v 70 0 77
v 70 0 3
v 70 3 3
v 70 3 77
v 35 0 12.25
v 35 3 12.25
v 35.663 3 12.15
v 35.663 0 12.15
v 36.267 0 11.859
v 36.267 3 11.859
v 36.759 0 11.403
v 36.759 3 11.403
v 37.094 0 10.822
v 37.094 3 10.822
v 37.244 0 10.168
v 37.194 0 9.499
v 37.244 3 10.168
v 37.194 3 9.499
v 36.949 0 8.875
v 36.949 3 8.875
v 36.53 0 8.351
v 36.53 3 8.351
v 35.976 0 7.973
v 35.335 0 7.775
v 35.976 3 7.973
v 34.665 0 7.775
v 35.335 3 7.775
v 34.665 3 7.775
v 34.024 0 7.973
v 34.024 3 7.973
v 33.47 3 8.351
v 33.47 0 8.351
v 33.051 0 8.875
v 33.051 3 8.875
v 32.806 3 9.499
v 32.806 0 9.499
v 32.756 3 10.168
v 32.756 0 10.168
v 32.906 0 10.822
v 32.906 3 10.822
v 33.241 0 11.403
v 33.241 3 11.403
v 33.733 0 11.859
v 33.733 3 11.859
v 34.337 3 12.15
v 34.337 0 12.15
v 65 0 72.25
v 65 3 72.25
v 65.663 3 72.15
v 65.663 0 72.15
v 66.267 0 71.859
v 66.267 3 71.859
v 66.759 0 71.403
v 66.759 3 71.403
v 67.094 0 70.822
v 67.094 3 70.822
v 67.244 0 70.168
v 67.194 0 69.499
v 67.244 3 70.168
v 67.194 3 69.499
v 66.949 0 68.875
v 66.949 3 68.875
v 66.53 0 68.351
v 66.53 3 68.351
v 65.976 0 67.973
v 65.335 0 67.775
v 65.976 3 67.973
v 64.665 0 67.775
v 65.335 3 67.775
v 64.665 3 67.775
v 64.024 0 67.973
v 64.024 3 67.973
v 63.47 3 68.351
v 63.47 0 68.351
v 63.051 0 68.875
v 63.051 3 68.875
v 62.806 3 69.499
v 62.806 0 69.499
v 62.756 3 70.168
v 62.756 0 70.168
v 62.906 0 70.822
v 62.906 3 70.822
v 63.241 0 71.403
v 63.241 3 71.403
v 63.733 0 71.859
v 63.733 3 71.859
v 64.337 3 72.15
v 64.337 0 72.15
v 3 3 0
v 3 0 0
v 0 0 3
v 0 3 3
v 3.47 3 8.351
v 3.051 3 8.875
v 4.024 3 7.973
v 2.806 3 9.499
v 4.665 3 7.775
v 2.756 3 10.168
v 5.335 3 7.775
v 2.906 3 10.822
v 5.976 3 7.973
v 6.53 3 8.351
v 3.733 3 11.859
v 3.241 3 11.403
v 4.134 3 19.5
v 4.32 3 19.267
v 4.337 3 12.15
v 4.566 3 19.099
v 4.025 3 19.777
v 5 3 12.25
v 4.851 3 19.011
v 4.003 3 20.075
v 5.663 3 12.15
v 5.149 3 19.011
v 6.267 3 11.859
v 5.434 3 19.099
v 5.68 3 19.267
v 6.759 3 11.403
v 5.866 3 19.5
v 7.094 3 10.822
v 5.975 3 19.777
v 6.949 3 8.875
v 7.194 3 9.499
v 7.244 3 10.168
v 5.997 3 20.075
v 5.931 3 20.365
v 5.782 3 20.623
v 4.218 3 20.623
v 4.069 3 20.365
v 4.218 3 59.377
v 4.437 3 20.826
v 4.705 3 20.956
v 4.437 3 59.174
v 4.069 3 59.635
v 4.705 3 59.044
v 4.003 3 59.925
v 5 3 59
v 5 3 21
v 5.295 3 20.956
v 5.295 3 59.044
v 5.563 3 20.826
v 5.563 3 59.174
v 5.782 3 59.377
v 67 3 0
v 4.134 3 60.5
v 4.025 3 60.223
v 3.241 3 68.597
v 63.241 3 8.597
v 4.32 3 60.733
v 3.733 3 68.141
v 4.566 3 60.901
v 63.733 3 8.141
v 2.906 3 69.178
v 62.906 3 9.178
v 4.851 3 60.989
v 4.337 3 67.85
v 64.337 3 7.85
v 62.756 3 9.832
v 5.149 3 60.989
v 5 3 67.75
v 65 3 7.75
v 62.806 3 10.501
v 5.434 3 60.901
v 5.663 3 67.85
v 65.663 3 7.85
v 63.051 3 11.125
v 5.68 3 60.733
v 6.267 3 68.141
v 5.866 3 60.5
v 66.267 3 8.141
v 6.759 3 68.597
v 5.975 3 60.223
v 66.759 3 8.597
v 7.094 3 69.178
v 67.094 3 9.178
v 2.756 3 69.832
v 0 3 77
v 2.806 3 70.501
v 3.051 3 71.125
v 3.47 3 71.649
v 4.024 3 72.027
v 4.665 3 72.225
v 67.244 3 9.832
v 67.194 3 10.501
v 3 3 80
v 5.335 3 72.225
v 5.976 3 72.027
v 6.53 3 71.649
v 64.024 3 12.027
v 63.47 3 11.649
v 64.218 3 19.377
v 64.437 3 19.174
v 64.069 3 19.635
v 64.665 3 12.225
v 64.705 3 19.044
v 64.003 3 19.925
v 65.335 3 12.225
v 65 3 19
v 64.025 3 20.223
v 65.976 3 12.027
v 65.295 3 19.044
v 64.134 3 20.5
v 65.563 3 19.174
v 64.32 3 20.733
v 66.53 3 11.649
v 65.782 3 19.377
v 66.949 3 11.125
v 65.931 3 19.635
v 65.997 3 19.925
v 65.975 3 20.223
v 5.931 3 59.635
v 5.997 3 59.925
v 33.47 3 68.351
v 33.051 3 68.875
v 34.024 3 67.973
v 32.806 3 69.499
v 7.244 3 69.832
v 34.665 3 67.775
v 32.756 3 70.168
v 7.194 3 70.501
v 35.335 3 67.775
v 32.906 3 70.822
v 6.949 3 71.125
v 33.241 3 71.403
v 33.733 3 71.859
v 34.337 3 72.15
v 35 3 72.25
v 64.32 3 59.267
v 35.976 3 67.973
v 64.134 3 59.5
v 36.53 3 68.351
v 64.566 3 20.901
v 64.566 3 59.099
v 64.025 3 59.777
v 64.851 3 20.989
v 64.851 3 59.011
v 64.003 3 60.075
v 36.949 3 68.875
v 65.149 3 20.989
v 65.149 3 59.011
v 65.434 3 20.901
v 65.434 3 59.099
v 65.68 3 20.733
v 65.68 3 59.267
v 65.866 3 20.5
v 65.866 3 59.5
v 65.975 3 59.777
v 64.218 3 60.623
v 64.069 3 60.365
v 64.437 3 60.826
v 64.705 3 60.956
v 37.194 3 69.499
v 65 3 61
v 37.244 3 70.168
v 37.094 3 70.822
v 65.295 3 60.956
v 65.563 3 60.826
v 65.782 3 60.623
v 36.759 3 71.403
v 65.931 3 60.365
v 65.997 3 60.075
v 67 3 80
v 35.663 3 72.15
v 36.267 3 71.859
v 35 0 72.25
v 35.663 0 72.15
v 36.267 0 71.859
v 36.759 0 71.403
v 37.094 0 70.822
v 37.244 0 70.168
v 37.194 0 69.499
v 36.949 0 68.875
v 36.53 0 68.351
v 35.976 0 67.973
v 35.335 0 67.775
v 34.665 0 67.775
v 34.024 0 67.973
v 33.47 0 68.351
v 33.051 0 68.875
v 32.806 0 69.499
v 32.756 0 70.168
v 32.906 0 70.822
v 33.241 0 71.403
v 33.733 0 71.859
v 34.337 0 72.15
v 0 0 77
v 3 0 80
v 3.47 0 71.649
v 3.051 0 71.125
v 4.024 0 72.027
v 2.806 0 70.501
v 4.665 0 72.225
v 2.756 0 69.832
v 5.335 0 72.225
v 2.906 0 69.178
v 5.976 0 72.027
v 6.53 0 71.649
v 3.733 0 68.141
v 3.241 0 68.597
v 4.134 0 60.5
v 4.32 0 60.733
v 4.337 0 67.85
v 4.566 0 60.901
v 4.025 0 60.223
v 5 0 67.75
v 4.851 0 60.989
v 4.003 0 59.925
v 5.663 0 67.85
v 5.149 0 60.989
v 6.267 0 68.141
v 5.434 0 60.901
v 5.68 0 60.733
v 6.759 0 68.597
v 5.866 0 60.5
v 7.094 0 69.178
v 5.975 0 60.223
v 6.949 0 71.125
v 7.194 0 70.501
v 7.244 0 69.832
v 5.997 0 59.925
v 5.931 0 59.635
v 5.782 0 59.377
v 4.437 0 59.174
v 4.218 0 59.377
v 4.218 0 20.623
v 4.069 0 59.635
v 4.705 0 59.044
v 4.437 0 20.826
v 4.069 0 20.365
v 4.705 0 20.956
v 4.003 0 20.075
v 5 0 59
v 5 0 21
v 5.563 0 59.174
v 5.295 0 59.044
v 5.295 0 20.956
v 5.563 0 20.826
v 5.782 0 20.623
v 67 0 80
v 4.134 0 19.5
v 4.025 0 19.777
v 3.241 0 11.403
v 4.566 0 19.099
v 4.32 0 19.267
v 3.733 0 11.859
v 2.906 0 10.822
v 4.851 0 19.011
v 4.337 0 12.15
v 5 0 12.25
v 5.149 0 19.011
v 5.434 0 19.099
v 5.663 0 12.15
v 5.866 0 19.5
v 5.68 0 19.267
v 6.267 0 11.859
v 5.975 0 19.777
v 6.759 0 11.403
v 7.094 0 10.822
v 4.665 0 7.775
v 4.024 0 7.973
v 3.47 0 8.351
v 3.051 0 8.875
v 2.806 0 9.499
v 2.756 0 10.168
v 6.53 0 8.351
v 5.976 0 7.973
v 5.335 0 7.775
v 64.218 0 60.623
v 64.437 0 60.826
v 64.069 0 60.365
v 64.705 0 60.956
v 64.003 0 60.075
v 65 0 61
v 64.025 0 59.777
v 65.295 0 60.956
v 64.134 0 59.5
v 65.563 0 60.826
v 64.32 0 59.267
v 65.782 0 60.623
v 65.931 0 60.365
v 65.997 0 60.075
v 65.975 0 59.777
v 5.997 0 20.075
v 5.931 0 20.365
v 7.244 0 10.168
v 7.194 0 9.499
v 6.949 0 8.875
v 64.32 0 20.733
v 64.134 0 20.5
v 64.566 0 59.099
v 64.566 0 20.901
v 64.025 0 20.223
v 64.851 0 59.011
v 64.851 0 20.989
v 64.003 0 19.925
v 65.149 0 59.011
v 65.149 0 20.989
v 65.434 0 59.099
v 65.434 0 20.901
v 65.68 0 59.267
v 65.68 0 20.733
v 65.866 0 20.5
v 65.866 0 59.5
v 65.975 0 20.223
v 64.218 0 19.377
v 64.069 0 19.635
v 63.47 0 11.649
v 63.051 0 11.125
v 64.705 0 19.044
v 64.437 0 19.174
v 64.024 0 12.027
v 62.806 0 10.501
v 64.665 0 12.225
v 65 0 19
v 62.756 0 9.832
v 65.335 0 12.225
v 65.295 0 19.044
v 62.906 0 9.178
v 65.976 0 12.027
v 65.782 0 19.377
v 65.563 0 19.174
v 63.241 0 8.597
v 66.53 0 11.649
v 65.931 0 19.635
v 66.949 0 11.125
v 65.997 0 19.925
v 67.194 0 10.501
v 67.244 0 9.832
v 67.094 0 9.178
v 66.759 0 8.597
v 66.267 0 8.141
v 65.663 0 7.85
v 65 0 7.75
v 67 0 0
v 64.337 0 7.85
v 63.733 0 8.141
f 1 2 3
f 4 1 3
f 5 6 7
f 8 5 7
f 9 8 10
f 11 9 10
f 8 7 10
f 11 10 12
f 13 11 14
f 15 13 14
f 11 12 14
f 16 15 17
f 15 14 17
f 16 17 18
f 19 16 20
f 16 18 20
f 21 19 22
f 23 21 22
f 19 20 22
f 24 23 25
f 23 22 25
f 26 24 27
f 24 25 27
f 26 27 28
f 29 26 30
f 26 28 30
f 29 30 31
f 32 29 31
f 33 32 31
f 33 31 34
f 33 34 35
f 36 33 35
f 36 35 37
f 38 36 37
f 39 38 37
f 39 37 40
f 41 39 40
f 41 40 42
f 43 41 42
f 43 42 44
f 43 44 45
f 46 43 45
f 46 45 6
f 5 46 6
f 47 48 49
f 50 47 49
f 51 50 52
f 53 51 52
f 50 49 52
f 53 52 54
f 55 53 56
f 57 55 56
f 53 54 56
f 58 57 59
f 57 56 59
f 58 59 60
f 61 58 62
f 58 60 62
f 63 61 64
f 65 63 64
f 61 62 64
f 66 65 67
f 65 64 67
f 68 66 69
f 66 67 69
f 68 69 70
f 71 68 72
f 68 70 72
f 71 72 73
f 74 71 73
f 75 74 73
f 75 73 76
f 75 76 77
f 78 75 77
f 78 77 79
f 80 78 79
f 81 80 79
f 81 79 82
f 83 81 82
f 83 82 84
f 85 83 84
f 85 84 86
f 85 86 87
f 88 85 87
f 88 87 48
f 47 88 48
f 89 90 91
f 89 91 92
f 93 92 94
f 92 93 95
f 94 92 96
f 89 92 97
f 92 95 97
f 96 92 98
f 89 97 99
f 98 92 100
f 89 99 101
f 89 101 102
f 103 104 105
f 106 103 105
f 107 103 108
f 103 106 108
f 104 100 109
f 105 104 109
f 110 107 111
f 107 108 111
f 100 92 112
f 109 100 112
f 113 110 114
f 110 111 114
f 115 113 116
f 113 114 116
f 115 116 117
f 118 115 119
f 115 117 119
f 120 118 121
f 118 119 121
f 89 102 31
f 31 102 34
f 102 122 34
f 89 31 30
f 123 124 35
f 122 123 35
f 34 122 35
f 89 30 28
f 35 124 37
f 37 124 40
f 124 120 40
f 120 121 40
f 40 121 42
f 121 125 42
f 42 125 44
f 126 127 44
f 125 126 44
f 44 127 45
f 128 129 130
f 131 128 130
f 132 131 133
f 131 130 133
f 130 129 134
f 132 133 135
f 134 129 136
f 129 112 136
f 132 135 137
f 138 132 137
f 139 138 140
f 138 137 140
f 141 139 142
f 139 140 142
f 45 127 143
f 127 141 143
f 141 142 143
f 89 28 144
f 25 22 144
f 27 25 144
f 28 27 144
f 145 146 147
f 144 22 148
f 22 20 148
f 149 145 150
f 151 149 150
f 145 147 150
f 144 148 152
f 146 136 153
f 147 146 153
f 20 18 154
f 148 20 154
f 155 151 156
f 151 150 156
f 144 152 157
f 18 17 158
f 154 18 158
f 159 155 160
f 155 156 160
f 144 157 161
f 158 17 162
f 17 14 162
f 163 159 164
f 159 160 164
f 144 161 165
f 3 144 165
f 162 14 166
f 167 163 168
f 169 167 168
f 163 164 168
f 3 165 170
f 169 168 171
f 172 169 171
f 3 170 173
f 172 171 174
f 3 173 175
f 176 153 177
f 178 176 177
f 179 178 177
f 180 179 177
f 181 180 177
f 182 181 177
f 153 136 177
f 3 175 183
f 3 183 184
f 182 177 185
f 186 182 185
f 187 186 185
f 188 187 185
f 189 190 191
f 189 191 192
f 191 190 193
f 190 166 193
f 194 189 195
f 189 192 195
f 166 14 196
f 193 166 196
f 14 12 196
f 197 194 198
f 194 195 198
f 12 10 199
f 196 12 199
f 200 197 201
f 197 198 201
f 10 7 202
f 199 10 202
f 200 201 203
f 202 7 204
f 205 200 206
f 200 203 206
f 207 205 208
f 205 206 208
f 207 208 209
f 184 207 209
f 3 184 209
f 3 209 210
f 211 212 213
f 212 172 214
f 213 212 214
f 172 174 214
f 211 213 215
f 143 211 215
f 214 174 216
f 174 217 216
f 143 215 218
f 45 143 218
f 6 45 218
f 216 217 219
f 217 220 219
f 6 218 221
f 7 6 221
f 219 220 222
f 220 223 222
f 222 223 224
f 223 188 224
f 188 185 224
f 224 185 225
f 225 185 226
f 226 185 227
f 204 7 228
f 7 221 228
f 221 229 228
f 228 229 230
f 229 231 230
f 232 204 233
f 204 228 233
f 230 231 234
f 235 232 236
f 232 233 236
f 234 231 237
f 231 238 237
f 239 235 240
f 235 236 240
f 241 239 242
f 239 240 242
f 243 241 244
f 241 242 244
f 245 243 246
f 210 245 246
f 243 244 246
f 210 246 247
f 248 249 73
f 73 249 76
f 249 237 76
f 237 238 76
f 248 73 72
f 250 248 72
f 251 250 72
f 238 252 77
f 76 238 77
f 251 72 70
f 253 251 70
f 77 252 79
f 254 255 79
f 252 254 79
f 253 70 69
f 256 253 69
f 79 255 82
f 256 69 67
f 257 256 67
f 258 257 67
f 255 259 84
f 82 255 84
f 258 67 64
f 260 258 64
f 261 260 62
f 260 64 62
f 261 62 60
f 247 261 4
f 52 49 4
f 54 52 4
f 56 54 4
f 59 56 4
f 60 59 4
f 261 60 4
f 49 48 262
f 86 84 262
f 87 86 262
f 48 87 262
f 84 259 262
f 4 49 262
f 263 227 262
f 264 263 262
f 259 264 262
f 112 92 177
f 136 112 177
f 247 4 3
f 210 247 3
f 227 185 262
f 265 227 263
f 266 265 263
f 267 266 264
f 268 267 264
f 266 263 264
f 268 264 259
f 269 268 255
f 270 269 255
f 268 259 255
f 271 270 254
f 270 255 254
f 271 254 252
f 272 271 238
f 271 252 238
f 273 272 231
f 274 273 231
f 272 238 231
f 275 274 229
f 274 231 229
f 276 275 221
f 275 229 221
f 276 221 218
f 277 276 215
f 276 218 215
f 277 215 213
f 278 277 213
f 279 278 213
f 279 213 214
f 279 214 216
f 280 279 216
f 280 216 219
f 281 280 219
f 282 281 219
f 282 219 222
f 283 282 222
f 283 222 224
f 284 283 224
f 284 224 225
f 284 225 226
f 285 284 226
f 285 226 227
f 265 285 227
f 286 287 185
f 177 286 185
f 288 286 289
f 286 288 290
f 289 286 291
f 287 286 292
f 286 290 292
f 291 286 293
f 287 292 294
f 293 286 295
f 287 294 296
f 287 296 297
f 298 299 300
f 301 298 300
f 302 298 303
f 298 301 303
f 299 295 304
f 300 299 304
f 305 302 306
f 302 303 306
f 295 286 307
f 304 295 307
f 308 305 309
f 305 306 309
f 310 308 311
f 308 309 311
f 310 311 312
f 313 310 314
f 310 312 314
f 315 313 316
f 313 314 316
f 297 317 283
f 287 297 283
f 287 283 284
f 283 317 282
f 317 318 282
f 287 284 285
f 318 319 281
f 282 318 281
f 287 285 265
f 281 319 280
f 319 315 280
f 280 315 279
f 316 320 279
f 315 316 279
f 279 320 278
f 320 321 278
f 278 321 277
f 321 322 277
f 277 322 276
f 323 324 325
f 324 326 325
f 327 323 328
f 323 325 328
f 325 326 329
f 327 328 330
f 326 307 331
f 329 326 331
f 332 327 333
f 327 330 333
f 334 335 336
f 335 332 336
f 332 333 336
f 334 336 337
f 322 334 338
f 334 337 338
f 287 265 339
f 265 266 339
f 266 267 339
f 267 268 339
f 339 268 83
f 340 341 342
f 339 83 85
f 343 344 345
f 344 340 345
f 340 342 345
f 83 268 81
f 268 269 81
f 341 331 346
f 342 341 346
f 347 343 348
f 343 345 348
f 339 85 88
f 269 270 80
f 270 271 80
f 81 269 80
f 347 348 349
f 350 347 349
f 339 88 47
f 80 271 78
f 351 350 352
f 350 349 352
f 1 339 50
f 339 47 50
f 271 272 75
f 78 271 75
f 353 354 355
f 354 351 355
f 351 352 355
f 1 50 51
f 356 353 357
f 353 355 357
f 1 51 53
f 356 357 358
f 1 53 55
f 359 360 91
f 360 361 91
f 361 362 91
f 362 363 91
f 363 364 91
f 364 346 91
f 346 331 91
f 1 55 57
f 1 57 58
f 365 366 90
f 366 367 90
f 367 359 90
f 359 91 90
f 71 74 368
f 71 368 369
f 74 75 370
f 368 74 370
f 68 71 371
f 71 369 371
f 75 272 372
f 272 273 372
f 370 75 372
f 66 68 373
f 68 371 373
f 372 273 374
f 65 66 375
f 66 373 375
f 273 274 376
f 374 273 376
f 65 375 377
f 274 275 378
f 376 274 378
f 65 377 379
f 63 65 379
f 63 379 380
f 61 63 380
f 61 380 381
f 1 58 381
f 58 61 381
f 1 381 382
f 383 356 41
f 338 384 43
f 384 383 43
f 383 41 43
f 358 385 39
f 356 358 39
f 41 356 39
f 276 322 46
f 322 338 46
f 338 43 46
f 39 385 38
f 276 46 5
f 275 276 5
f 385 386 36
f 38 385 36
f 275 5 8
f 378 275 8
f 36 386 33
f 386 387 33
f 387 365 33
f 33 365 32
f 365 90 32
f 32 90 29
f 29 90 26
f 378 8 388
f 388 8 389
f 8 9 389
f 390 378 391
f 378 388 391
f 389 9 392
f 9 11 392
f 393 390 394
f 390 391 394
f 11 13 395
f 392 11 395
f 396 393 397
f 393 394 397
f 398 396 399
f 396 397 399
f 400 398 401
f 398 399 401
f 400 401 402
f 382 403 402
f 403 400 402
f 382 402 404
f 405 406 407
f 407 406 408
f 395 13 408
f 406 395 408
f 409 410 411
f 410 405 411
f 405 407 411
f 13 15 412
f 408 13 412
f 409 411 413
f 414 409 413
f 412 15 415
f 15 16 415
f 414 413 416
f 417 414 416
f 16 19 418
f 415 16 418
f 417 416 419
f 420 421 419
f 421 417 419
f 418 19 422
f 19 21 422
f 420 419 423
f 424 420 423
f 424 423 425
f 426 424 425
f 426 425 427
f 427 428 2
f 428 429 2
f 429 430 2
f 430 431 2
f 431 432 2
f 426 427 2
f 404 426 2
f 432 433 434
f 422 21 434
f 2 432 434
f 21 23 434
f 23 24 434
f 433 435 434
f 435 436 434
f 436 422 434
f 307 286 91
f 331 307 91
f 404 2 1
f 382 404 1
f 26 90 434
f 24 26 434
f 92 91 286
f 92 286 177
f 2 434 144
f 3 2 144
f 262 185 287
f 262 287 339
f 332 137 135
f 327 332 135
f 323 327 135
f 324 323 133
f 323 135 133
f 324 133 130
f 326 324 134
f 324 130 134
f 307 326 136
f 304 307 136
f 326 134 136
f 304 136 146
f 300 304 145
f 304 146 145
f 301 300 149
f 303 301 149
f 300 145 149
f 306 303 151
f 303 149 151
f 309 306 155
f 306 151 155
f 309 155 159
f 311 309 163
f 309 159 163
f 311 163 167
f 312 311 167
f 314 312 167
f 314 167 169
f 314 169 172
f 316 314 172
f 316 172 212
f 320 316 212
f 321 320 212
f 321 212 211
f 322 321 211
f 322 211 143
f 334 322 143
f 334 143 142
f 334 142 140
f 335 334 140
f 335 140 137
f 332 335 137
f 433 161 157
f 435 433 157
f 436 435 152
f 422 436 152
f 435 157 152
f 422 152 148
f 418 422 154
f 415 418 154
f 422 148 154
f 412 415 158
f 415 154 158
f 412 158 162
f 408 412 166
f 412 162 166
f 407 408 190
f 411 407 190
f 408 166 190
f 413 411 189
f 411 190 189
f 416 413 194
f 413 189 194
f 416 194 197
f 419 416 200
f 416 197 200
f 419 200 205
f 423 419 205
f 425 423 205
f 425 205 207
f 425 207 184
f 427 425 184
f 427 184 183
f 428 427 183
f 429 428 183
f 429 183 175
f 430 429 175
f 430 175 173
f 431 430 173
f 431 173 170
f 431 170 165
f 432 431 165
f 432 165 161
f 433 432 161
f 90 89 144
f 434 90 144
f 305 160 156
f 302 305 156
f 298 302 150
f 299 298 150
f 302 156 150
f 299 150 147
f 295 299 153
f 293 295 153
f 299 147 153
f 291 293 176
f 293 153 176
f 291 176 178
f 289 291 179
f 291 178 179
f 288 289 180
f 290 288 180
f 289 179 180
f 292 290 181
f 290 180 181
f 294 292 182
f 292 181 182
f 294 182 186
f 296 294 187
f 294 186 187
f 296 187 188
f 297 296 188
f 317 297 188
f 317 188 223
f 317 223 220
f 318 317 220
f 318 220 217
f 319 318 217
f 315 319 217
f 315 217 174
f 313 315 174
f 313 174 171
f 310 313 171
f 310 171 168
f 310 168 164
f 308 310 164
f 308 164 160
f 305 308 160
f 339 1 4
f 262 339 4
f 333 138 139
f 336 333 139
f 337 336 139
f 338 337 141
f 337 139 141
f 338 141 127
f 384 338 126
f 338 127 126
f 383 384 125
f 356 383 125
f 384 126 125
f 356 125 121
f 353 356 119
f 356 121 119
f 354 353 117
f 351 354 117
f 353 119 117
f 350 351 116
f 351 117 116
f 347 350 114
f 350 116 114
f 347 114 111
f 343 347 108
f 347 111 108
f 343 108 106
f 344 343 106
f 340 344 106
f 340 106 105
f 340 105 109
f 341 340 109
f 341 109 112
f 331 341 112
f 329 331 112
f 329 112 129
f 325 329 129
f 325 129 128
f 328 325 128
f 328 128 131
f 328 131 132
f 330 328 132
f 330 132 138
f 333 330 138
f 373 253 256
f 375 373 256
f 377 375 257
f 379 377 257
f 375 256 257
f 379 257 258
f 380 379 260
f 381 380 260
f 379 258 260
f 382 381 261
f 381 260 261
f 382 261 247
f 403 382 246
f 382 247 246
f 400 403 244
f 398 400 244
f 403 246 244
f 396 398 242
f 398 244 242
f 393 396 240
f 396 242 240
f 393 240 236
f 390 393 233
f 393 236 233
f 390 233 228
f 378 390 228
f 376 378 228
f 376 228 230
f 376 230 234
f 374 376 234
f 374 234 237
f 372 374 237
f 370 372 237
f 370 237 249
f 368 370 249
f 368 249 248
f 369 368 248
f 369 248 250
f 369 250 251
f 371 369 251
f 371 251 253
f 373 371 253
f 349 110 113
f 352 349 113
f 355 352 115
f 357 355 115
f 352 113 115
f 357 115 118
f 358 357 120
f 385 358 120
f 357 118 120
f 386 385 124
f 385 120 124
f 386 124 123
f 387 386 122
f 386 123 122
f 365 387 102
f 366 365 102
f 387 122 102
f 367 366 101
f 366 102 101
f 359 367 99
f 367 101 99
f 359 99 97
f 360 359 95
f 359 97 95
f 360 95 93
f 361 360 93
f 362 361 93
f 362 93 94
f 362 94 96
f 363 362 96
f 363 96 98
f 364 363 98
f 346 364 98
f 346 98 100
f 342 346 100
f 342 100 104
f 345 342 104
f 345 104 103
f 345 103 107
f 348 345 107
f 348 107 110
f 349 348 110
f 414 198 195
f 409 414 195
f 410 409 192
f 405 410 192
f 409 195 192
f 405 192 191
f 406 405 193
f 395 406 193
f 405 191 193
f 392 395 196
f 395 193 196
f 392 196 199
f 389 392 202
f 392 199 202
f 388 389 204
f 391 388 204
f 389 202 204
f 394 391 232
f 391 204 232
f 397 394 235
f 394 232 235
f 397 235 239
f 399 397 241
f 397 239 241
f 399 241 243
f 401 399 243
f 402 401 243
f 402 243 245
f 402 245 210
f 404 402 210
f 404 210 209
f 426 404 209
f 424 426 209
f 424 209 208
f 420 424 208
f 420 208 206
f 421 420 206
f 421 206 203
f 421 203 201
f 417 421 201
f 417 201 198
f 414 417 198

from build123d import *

# Parameters (mm, degrees)
ESQUISSE1_W             = 70
ESQUISSE1_H             = 12
BOSS_EXTRU_1_DEPTH      = 80
ESQUISSE2_W             = 12
ESQUISSE2_H             = 6
ENL_V_MAT_EXTRU_1_DEPTH = 107.976632963
ESQUISSE4_R             = 2.25
ENL_V_MAT_EXTRU_3_DEPTH = 107.976632963
ESQUISSE5_W             = 12
ESQUISSE5_H             = 10
BOSS_EXTRU_2_DEPTH      = 6
CHANFREIN1_SIZE         = 3
ESQUISSE6_R             = 1
ENL_V_MAT_EXTRU_4_DEPTH = 12
ESQUISSE8_W             = 70
ESQUISSE8_H             = 9
ENL_V_MAT_EXTRU_8_DEPTH = 80


with BuildPart() as part:
    # Esquisse1 → Boss.-Extru.1 (new body)
    with BuildSketch(Plane.XY):
        with Locations((35, 6)):
            Rectangle(ESQUISSE1_W, ESQUISSE1_H)
    extrude(amount=BOSS_EXTRU_1_DEPTH)

    # Esquisse2 → Enlèv. mat.-Extru.1 (cut, through all)
    with BuildSketch(Plane.XY.offset(80)):
        with Locations((52.5, 9)):
            Rectangle(ESQUISSE2_W, ESQUISSE2_H)
        with Locations((17.5, 9)):
            Rectangle(ESQUISSE2_W, ESQUISSE2_H)
    extrude(amount=-ENL_V_MAT_EXTRU_1_DEPTH, mode=Mode.SUBTRACT)

    # Esquisse4 → Enlèv. mat.-Extru.3 (cut, through all)
    with BuildSketch(Plane(origin=(0, 12, 0), x_dir=(1, 0, 0), z_dir=(0, 1, 0))):
        with Locations(Location((5, -10, 0), (0, 0, 270))):
            Circle(ESQUISSE4_R)
        with Locations(Location((65, -70, 0), (0, 0, 270))):
            Circle(ESQUISSE4_R)
        with Locations(Location((65, -10, 0), (0, 0, 90))):
            Circle(ESQUISSE4_R)
        with Locations(Location((5, -70, 0), (0, 0, 90))):
            Circle(ESQUISSE4_R)
        with Locations(Location((35, -10, 0), (0, 0, 270))):
            Circle(ESQUISSE4_R)
        with Locations(Location((35, -70, 0), (0, 0, 270))):
            Circle(ESQUISSE4_R)
    extrude(amount=-ENL_V_MAT_EXTRU_3_DEPTH, mode=Mode.SUBTRACT)

    # Esquisse5 → Boss.-Extru.2 (add)
    with BuildSketch(Plane(origin=(0, 12, 0), x_dir=(1, 0, 0), z_dir=(0, 1, 0))):
        with Locations((17.5, -75)):
            Rectangle(ESQUISSE5_W, ESQUISSE5_H)
        with Locations((52.5, -75)):
            Rectangle(ESQUISSE5_W, ESQUISSE5_H)
        with Locations((52.5, -5)):
            Rectangle(ESQUISSE5_W, ESQUISSE5_H)
        with Locations((17.5, -5)):
            Rectangle(ESQUISSE5_W, ESQUISSE5_H)
    extrude(amount=-BOSS_EXTRU_2_DEPTH)

    # Chanfrein1
    chanfrein1_edges = [part.edges().sort_by_distance(p)[0] for p in [
        (70, 6, 80),
        (0, 6, 80),
        (70, 6, 0),
        (0, 6, 0),
    ]]
    chamfer(chanfrein1_edges, length=CHANFREIN1_SIZE)

    # Esquisse6 → Enlèv. mat.-Extru.4 (cut)
    with BuildSketch(Plane(origin=(0, 12, 0), x_dir=(1, 0, 0), z_dir=(0, 1, 0))):
        with Locations(Location((5, -20, 0), (0, 0, 270))):
            Circle(ESQUISSE6_R)
        with Locations(Location((5, -60, 0), (0, 0, 90))):
            Circle(ESQUISSE6_R)
        with Locations(Location((65, -60, 0), (0, 0, 270))):
            Circle(ESQUISSE6_R)
        with Locations(Location((65, -20, 0), (0, 0, 90))):
            Circle(ESQUISSE6_R)
    extrude(amount=-ENL_V_MAT_EXTRU_4_DEPTH, mode=Mode.SUBTRACT)

    # Esquisse8 → Enlèv. mat.-Extru.8 (cut)
    with BuildSketch(Plane.XY.offset(80)):
        with Locations((35, 7.5)):
            Rectangle(ESQUISSE8_W, ESQUISSE8_H)
    extrude(amount=-ENL_V_MAT_EXTRU_8_DEPTH, mode=Mode.SUBTRACT)


solid = part.part
